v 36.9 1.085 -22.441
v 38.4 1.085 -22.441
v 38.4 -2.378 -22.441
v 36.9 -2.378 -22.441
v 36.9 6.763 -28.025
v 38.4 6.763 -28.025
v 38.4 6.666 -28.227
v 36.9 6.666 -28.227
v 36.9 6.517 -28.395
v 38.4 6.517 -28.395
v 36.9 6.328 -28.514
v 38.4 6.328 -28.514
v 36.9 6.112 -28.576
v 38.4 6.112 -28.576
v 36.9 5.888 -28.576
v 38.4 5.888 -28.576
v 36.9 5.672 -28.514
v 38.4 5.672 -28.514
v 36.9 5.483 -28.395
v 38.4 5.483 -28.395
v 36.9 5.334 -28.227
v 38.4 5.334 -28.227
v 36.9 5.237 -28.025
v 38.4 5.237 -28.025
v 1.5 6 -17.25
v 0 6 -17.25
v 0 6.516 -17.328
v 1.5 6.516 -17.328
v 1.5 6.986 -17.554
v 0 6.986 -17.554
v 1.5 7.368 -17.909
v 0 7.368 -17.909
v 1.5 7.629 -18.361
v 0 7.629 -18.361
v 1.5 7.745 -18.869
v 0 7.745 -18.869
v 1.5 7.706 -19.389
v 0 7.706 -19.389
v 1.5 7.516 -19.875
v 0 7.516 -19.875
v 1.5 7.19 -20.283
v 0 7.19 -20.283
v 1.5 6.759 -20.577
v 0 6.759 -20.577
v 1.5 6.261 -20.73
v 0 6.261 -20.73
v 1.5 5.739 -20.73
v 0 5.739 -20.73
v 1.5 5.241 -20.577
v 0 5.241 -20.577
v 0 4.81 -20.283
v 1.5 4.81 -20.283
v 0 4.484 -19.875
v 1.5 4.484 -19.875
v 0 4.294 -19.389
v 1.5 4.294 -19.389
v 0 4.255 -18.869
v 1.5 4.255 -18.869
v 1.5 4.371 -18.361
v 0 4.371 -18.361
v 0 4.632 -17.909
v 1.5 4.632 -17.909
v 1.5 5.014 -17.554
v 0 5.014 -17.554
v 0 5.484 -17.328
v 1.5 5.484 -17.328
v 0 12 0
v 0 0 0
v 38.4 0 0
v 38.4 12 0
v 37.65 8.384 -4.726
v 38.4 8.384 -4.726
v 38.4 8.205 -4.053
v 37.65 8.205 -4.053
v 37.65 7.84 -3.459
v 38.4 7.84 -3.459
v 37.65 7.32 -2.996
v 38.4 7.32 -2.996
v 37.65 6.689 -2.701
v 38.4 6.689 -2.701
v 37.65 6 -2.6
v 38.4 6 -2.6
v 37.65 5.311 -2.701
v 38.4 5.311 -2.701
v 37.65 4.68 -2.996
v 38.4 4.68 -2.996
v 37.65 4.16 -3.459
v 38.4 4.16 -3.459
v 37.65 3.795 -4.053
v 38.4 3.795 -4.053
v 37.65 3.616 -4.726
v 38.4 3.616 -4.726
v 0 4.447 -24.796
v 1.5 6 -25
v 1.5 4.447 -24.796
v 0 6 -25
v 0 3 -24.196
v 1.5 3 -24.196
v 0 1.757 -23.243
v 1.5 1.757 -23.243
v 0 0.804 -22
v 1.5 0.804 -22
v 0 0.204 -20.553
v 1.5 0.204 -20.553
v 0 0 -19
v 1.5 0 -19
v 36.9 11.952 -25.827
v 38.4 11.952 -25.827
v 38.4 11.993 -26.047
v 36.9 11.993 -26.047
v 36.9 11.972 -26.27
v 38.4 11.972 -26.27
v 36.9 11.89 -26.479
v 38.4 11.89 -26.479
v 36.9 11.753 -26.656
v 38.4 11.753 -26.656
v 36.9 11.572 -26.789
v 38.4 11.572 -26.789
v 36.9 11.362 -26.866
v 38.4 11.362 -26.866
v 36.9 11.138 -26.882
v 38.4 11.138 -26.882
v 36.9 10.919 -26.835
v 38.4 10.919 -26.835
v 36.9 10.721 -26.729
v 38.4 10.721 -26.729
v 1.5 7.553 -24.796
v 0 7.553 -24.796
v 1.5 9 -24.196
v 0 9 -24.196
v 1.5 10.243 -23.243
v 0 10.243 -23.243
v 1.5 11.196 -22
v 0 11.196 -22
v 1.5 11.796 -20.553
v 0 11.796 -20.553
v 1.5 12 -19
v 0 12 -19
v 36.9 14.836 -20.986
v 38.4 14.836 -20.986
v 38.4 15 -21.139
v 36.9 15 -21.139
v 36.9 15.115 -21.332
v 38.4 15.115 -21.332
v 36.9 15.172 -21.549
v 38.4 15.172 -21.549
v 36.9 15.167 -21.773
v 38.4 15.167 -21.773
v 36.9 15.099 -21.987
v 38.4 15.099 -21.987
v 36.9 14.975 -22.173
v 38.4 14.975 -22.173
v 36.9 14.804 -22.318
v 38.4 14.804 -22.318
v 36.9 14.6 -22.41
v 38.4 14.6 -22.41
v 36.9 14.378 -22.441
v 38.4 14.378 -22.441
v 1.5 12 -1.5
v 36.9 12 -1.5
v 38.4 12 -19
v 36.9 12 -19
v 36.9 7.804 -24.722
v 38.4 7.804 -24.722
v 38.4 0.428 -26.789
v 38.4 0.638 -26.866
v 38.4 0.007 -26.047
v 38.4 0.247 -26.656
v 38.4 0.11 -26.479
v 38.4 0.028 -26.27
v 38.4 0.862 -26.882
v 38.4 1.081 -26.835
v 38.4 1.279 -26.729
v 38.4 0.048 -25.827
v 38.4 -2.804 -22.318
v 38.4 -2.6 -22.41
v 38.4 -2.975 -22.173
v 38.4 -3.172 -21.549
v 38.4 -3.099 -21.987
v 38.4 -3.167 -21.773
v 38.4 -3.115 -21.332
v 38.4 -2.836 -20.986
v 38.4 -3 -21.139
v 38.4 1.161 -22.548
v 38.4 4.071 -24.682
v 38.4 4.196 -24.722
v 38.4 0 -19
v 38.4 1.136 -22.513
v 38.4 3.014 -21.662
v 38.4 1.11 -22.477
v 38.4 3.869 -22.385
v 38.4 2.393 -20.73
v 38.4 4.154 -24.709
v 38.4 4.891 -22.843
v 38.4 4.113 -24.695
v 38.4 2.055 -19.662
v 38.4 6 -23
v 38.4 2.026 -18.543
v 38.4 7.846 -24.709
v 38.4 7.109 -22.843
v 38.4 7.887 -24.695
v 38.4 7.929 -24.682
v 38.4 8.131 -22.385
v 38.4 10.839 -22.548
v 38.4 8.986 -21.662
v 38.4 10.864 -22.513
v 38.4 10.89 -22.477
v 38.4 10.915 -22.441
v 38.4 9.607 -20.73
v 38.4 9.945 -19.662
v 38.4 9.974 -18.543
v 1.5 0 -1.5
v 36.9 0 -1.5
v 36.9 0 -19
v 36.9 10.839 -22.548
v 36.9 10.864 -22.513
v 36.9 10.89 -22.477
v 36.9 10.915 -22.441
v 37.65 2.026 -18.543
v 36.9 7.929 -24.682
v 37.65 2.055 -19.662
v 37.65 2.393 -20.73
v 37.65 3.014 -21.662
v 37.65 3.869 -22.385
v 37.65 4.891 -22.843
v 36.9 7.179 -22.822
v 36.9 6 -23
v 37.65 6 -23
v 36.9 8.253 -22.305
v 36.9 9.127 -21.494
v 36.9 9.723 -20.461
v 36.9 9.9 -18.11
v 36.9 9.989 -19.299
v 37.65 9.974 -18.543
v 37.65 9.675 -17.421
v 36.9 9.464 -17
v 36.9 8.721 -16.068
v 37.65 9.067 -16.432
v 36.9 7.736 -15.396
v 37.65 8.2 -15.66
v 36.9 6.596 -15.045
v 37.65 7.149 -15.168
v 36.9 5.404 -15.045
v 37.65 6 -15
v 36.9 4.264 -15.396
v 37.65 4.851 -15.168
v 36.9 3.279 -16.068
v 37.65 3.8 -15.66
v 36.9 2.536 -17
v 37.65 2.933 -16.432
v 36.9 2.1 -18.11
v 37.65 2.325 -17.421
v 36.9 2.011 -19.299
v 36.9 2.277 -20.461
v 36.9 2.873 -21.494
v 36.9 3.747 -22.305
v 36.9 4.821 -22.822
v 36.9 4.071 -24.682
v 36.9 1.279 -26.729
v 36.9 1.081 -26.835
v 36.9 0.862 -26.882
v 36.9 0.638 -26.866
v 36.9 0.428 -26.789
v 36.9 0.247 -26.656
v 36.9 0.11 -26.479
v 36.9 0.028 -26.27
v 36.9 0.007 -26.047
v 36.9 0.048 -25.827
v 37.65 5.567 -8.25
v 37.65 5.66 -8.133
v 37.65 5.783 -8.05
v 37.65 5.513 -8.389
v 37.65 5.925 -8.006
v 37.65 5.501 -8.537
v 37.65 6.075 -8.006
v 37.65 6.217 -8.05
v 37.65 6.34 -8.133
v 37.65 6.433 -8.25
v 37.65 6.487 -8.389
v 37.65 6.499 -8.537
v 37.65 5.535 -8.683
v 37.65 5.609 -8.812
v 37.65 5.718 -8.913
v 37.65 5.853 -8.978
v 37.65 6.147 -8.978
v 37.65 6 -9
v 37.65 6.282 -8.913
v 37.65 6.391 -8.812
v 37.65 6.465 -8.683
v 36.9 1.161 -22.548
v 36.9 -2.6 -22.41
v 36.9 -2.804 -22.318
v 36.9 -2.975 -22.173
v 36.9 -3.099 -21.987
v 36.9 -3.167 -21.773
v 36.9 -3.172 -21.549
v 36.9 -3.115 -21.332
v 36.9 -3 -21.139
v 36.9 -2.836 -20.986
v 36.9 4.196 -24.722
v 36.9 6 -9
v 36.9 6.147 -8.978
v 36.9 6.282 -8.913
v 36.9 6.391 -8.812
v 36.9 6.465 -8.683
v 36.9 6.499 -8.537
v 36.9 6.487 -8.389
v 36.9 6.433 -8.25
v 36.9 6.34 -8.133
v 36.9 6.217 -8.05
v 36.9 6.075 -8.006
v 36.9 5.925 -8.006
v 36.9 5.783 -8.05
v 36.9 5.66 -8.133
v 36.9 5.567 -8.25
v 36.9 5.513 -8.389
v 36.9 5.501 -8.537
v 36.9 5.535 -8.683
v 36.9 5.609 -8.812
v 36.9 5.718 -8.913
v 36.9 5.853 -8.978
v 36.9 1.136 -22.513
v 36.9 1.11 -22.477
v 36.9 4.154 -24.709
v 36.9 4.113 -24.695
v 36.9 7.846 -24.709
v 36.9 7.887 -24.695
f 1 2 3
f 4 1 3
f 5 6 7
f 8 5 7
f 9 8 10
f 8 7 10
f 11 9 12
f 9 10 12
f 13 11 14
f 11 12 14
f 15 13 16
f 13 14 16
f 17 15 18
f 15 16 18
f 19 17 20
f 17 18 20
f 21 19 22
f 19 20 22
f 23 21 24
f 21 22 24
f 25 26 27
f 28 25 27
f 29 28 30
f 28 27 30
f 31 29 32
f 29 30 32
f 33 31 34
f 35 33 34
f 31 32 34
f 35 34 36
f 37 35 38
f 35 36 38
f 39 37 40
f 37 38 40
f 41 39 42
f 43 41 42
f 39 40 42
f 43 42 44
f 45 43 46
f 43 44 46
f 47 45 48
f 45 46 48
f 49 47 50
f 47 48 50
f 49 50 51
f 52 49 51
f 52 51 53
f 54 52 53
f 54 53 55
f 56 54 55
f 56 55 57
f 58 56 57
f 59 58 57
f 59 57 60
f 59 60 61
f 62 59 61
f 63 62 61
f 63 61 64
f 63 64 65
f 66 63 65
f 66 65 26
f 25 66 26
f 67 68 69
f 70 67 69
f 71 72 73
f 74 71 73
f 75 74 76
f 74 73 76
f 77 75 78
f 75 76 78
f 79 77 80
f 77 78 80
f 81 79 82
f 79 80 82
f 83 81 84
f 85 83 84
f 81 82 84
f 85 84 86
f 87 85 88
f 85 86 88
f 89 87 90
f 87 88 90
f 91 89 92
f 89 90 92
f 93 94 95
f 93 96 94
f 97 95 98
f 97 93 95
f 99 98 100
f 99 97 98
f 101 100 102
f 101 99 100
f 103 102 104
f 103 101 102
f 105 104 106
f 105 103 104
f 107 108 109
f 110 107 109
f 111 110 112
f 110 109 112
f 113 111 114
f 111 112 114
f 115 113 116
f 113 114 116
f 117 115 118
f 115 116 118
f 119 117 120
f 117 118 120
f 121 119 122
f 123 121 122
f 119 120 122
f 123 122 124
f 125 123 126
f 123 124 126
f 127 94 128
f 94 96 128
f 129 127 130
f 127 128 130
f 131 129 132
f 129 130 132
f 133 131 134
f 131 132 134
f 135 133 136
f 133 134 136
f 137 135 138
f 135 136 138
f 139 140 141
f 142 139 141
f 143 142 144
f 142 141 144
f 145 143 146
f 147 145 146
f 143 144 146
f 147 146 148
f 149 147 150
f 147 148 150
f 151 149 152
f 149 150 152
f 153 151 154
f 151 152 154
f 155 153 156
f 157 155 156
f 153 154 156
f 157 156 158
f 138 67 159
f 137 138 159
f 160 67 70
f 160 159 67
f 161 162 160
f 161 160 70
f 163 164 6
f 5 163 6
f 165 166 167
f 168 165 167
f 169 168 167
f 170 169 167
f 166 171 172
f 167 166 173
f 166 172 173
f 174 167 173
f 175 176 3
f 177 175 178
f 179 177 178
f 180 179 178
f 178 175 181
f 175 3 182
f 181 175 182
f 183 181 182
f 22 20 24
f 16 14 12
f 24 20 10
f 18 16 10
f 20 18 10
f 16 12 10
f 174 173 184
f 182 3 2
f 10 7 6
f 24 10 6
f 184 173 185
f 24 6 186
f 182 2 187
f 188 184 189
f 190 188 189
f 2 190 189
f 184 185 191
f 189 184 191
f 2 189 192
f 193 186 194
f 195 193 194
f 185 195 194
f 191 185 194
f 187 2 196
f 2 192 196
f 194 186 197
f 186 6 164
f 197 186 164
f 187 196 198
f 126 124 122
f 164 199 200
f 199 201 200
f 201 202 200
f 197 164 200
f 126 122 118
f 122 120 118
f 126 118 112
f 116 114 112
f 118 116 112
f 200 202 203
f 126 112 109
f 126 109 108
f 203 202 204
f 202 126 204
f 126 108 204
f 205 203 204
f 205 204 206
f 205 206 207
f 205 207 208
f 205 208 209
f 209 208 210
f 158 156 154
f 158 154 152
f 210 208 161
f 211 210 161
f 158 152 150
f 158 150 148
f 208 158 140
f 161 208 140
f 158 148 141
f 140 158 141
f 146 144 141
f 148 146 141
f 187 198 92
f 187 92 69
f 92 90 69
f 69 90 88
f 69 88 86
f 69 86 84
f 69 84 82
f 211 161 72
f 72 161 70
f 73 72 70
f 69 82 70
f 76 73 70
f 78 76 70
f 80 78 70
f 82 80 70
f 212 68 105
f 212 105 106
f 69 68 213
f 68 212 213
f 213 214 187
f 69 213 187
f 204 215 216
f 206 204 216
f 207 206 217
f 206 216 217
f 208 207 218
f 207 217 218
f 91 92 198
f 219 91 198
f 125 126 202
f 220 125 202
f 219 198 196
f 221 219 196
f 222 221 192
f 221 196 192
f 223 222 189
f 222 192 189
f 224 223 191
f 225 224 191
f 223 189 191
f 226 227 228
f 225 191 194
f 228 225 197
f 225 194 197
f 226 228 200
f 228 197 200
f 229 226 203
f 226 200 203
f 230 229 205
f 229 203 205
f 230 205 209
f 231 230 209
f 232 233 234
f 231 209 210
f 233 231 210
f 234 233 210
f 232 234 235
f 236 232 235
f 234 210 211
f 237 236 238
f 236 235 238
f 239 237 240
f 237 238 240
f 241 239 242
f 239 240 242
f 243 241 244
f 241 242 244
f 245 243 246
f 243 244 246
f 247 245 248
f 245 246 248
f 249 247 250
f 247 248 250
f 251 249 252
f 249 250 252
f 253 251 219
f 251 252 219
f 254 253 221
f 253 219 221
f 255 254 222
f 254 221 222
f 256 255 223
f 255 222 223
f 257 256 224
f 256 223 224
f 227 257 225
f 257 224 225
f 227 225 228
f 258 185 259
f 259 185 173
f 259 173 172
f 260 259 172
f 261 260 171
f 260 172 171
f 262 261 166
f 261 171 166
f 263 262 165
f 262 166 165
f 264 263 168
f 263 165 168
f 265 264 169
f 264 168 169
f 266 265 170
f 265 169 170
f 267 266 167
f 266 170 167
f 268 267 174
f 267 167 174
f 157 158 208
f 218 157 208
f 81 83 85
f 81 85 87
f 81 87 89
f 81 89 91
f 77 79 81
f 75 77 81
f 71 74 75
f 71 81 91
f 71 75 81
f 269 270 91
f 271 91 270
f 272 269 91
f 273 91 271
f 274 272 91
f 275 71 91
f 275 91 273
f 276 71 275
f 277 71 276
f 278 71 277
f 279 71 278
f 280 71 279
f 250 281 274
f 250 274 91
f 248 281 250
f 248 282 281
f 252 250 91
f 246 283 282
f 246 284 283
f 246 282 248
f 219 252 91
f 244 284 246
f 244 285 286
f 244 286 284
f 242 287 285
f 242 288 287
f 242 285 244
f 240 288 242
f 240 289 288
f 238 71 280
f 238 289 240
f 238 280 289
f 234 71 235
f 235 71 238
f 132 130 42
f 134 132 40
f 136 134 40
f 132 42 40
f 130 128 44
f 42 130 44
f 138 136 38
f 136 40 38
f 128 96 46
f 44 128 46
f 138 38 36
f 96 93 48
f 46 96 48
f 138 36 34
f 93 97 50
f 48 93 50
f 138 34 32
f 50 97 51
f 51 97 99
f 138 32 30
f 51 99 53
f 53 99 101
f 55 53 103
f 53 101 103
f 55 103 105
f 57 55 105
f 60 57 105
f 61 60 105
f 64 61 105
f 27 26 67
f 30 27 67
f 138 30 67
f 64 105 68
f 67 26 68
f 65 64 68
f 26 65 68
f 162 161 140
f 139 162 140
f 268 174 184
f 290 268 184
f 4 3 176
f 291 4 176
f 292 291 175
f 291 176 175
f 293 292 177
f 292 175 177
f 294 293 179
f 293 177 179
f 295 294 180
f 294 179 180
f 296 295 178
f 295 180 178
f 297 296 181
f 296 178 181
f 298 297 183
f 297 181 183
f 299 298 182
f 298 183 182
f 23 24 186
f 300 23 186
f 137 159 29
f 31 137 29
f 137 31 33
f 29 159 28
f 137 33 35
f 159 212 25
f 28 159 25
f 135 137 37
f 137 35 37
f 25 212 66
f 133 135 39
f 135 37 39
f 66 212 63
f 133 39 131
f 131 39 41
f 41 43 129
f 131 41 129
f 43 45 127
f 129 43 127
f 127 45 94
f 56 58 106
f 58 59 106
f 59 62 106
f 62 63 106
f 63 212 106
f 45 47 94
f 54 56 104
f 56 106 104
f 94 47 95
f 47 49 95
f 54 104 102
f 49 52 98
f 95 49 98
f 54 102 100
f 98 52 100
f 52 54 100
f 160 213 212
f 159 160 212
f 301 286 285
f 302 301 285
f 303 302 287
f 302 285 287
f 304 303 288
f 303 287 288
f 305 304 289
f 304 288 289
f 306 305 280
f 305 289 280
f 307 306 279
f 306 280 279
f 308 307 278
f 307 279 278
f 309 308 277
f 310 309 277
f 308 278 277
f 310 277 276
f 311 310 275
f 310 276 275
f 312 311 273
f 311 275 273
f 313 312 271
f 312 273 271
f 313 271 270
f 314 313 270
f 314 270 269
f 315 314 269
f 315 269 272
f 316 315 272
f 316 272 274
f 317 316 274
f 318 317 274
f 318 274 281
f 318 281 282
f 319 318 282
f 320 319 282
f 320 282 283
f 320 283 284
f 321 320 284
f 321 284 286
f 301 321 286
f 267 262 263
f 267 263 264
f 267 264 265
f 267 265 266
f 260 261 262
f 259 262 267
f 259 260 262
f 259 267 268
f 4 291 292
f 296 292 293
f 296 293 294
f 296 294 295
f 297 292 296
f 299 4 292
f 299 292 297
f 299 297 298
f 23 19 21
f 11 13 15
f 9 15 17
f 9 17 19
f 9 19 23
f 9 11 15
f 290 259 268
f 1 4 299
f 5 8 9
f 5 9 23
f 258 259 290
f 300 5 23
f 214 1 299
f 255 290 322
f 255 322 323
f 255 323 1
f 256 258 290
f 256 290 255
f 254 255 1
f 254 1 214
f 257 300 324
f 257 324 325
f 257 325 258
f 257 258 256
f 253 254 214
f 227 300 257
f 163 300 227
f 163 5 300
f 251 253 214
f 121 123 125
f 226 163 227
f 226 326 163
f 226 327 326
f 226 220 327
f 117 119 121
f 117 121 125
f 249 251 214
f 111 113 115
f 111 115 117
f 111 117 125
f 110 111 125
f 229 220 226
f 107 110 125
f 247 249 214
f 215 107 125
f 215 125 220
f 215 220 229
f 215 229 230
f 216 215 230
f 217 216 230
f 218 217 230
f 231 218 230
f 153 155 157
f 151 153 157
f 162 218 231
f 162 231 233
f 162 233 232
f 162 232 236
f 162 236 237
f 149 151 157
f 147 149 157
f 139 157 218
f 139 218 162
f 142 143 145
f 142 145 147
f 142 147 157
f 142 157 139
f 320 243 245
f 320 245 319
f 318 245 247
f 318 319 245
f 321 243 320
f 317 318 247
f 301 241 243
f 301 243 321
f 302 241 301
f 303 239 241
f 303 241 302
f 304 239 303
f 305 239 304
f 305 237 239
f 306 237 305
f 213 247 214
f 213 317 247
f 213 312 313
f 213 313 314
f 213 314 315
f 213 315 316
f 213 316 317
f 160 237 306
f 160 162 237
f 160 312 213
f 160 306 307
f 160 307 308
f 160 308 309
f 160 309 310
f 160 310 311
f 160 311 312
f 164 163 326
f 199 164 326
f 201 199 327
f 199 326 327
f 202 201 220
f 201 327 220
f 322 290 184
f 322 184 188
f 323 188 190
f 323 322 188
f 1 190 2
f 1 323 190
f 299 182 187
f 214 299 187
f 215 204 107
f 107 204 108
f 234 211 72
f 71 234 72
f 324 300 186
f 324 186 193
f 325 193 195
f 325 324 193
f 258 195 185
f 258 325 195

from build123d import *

# Parameters (mm, degrees)
EXTRUDE_2_DEPTH     = 12
FILLET_1_R          = 6
CUT_EXTRUDE_1_DEPTH = 0.75
CUT_EXTRUDE_2_REACH = 48.76
SKETCH_4_R          = 4
CUT_EXTRUDE_3_REACH = 49.366
SKETCH_5_R          = 1.75
CUT_EXTRUDE_4_REACH = 48.76
SKETCH_6_R          = 0.5
EXTRUDE_4_DEPTH     = 1.5


with BuildPart() as part:
    # 草图2 → 凸台-拉伸2 (new body)
    with BuildSketch(Plane(origin=(0, 0, 0), x_dir=(1, 0, 0), z_dir=(0, 1, 0))):
        Polygon((0, 0), (38.4, 0), (38.4, 25), (36.9, 25), (36.9, 1.5), (1.5, 1.5), (1.5, 25), (0, 25), align=None)
    extrude(amount=EXTRUDE_2_DEPTH)

    # 圆角1
    fillet_1_edges = [part.edges().sort_by_distance(p)[0] for p in [
        (0.75, 0, -25),
        (0.75, 12, -25),
        (37.65, 0, -25),
        (37.65, 12, -25),
    ]]
    fillet(fillet_1_edges, radius=FILLET_1_R - 0.0001)  # a hair under: the kernel refuses the full size

    # 草图3 → 切除-拉伸1 (cut)
    with BuildSketch(Plane(origin=(38.4, 0, 0), x_dir=(0, 0, -1), z_dir=(1, 0, 0))):
        with BuildLine():
            Line((18.542857143, 9.973791692), (4.725714286, 8.384275015))
            ThreePointArc((4.725714286, 8.384275015), (2.6, 6), (4.725714286, 3.615724985))
            Line((4.725714286, 3.615724985), (18.542857143, 2.026208308))
            ThreePointArc((18.542857143, 2.026208308), (23, 6), (18.542857143, 9.973791692))
        make_face()
    extrude(amount=-CUT_EXTRUDE_1_DEPTH, mode=Mode.SUBTRACT)

    # 草图4 → 切除-拉伸2 (cut, up to next)
    with BuildSketch(Plane(origin=(37.65, 0, 0), x_dir=(0, 0, -1), z_dir=(1, 0, 0)), mode=Mode.PRIVATE) as cut_extrude_2_sk1:
        with Locations((19, 6)):
            Circle(SKETCH_4_R)
    cut_extrude_2_tool1 = extrude(cut_extrude_2_sk1.sketch, amount=-CUT_EXTRUDE_2_REACH, mode=Mode.PRIVATE) & part.part
    add(cut_extrude_2_tool1.solids().sort_by_distance((37.65, 6, -19))[0], mode=Mode.SUBTRACT)

    # 草图5 → 切除-拉伸3 (cut, up to next)
    with BuildSketch(Plane.ZY, mode=Mode.PRIVATE) as cut_extrude_3_sk1:
        with Locations((-19, 6)):
            Circle(SKETCH_5_R)
    cut_extrude_3_tool1 = extrude(cut_extrude_3_sk1.sketch, amount=-CUT_EXTRUDE_3_REACH, mode=Mode.PRIVATE) & part.part
    add(cut_extrude_3_tool1.solids().sort_by_distance((0, 6, -19))[0], mode=Mode.SUBTRACT)

    # 草图6 → 切除-拉伸4 (cut, up to next)
    with BuildSketch(Plane(origin=(37.65, 0, 0), x_dir=(0, 0, -1), z_dir=(1, 0, 0)), mode=Mode.PRIVATE) as cut_extrude_4_sk1:
        with Locations((8.5, 6)):
            Circle(SKETCH_6_R)
    cut_extrude_4_tool1 = extrude(cut_extrude_4_sk1.sketch, amount=-CUT_EXTRUDE_4_REACH, mode=Mode.PRIVATE) & part.part
    add(cut_extrude_4_tool1.solids().sort_by_distance((37.65, 6, -8.5))[0], mode=Mode.SUBTRACT)

    # 草图7 → 凸台-拉伸4 (add)
    with BuildSketch(Plane(origin=(38.4, 0, 0), x_dir=(0, 0, -1), z_dir=(1, 0, 0))):
        with BuildLine():
            Line((19, 12), (20.986136983, 14.836497573))
            ThreePointArc((20.986136983, 14.836497573), (21.882023258, 15.140609984), (22.441458618, 14.377636424))
            Line((22.441458618, 14.377636424), (22.441458618, 10.914912266))
            ThreePointArc((22.441458618, 10.914912266), (20.804234797, 11.722301704), (19, 12))
        make_face()
        with BuildLine():
            Line((26.729122981, 10.721132005), (24.681580777, 7.928636792))
            ThreePointArc((24.681580777, 7.928636792), (23.838667626, 9.54785789), (22.54785789, 10.838667626))
            Line((22.54785789, 10.838667626), (25.826815726, 11.951723827))
            ThreePointArc((25.826815726, 11.951723827), (26.729122981, 11.667227443), (26.729122981, 10.721132005))
        make_face()
        with BuildLine():
            Line((28.02476043, 5.237026439), (24.722301704, 4.195765203))
            ThreePointArc((24.722301704, 4.195765203), (25, 6), (24.722301704, 7.804234797))
            Line((24.722301704, 7.804234797), (28.02476043, 6.762973561))
            ThreePointArc((28.02476043, 6.762973561), (28.58419579, 6), (28.02476043, 5.237026439))
        make_face()
        with BuildLine():
            Line((25.826815726, 0.048276173), (22.54785789, 1.161332374))
            ThreePointArc((22.54785789, 1.161332374), (23.838667626, 2.45214211), (24.681580777, 4.071363208))
            Line((24.681580777, 4.071363208), (26.729122981, 1.278867995))
            ThreePointArc((26.729122981, 1.278867995), (26.729122981, 0.332772557), (25.826815726, 0.048276173))
        make_face()
        with BuildLine():
            Line((20.986136983, -2.836497573), (19, 0))
            ThreePointArc((19, 0), (20.804234797, 0.277698296), (22.441458618, 1.085087734))
            Line((22.441458618, 1.085087734), (22.441458618, -2.377636424))
            ThreePointArc((22.441458618, -2.377636424), (21.882023258, -3.140609984), (20.986136983, -2.836497573))
        make_face()
    extrude(amount=-EXTRUDE_4_DEPTH)


solid = part.part
